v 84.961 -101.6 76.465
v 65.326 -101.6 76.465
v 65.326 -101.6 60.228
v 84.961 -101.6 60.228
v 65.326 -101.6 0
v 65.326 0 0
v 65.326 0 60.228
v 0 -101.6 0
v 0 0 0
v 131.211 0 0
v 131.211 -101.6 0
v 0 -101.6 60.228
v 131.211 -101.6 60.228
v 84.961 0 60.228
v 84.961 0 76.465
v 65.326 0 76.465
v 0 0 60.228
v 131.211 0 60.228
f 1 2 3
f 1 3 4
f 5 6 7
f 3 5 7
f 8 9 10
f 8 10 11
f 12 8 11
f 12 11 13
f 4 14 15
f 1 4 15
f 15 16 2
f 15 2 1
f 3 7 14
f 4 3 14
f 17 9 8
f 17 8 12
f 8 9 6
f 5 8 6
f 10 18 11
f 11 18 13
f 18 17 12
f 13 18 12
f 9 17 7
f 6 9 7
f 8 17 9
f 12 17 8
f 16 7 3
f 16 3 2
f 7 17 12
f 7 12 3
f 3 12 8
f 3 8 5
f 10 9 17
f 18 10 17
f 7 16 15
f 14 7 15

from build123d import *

# Parameters (mm, degrees)
F0_W     = 65.3258264065
F0_H     = 60.2281540632
F1_DEPTH = 101.6
F0_W_2   = 19.6354985237
F0_H_2   = 16.2370502949
F2_W     = 101.6
F2_H     = 60.2281540632
F3_DEPTH = 131.2111467123


with BuildPart() as f1:
    # F0 (on Front) → F1 (new body)
    with BuildSketch(Plane.XZ):
        with Locations((32.6629132032, 30.1140770316)):
            Rectangle(F0_W, F0_H)
    extrude(amount=F1_DEPTH)


with BuildPart() as f1b:
    # F0 (on Front) → F1, piece 2 (new body)
    with BuildSketch(Plane.XZ):
        with Locations((75.1435756683, 68.3466792107)):
            Rectangle(F0_W_2, F0_H_2)
    extrude(amount=F1_DEPTH)


with BuildPart() as f3:
    # F2 (on face) → F3 (new body)
    with BuildSketch(Plane(origin=(0, 0, 0), x_dir=(0, -1, 0), z_dir=(-1, 0, 0))):
        with Locations((50.8, 30.1140770316)):
            Rectangle(F2_W, F2_H)
    extrude(amount=-F3_DEPTH)


solid = Compound([f1.part, f1b.part, f3.part])
